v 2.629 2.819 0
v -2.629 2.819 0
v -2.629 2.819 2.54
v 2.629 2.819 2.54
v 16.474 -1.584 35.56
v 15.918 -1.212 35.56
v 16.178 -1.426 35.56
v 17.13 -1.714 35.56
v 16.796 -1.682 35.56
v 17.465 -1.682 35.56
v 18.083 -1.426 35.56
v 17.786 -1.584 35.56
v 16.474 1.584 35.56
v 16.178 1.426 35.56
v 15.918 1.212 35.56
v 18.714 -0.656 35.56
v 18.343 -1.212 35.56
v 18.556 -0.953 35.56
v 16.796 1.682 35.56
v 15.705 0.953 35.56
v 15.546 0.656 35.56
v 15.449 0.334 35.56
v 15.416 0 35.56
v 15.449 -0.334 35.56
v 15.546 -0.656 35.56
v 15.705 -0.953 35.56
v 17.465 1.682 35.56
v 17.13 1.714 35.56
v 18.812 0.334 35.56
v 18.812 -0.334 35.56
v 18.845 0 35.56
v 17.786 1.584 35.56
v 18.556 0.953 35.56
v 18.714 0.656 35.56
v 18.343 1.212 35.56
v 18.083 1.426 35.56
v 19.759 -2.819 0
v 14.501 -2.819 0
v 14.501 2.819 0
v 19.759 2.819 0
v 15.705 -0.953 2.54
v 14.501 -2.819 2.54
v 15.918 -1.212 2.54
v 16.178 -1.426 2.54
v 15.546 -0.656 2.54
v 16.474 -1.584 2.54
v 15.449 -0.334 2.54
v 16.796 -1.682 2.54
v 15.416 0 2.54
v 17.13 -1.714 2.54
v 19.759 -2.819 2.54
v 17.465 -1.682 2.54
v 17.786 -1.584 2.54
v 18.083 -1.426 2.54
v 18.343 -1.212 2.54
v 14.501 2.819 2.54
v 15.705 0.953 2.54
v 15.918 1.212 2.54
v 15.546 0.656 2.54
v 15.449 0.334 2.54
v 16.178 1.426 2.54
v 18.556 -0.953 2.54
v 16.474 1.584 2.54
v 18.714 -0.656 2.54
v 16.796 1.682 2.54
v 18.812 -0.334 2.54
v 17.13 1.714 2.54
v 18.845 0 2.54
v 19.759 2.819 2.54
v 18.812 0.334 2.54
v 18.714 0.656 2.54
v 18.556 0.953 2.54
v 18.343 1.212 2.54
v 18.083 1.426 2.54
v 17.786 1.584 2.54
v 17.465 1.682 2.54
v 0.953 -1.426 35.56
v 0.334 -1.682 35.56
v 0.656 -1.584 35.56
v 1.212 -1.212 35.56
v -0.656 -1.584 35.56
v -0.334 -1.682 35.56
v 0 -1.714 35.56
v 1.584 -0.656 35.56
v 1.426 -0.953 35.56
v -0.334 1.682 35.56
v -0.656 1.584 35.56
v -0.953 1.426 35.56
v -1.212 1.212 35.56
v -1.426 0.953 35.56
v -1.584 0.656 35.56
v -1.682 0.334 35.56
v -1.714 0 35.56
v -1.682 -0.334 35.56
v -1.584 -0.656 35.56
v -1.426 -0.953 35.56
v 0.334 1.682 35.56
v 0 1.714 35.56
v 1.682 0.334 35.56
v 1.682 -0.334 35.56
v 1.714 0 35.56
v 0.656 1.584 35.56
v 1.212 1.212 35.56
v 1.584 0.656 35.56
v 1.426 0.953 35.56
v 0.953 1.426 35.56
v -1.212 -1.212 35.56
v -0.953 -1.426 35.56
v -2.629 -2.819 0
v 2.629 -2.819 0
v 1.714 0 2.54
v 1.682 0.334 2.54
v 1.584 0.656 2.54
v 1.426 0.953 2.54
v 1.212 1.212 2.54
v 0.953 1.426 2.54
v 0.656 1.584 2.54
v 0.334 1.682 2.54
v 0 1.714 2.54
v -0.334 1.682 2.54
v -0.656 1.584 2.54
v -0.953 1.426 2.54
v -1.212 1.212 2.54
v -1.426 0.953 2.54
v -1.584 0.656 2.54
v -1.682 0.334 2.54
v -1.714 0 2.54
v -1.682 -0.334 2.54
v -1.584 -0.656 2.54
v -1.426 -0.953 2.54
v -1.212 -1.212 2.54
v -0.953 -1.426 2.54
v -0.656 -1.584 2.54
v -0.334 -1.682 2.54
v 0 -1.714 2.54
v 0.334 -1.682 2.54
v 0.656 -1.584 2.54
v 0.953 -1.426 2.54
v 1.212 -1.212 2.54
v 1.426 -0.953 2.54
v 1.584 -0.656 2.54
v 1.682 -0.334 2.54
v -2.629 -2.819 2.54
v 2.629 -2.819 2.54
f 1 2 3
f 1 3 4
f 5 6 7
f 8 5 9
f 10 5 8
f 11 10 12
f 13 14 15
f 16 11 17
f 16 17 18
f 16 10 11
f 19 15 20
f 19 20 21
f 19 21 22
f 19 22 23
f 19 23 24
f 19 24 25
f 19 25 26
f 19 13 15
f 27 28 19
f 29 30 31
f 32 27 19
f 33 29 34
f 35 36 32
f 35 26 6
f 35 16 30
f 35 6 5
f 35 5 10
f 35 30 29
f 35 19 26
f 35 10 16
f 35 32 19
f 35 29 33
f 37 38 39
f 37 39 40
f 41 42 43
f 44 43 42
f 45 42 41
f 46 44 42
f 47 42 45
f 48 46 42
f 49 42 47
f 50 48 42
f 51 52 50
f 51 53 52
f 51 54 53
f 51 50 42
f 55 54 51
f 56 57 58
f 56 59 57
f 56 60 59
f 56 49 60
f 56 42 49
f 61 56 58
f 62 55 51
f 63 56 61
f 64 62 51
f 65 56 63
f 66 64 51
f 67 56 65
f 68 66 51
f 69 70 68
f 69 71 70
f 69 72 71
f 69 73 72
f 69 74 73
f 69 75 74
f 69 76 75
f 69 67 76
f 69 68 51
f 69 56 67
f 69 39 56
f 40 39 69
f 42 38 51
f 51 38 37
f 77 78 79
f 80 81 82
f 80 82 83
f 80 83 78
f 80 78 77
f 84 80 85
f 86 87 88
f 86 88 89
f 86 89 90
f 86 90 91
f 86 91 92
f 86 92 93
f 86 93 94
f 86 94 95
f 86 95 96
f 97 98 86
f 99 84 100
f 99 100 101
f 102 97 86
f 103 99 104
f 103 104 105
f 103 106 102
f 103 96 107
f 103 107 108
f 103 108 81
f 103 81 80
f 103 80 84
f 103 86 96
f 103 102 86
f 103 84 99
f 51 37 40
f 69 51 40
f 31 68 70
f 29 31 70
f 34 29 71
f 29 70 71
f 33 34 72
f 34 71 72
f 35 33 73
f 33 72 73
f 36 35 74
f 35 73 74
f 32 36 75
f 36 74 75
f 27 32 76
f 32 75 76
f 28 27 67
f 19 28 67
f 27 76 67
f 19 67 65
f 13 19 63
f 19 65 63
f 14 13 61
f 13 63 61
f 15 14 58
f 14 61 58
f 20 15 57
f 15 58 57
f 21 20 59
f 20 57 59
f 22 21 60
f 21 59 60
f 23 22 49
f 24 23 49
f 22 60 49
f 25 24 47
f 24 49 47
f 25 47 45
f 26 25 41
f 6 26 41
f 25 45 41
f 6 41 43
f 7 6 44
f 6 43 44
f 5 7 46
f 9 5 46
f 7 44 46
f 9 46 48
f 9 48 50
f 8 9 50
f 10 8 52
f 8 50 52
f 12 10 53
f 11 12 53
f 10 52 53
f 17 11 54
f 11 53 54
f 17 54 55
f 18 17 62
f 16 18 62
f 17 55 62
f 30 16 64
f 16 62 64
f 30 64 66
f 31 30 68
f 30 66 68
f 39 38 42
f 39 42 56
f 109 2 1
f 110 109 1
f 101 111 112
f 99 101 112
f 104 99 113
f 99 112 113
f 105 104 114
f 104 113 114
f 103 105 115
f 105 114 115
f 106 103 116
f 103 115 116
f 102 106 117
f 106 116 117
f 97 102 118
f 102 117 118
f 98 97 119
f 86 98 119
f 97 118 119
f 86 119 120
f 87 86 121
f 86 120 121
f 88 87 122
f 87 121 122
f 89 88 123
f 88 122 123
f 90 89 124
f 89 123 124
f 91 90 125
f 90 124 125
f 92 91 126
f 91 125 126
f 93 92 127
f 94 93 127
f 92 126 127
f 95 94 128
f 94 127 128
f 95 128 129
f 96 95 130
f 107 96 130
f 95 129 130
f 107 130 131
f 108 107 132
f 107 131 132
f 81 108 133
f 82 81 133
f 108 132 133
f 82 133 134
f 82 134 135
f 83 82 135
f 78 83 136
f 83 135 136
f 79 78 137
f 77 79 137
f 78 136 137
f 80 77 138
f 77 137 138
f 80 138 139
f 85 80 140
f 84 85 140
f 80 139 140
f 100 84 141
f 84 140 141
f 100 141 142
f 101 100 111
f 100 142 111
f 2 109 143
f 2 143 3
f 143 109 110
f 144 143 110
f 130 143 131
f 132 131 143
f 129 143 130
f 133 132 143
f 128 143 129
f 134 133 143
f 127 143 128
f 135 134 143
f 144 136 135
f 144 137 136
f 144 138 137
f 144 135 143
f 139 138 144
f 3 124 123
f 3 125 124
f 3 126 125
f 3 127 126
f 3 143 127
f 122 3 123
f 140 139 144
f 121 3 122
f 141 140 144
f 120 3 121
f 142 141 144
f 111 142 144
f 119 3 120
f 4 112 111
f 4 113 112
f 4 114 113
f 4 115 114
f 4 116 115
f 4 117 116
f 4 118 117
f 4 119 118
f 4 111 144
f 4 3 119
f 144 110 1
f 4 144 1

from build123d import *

# Parameters (mm, degrees)
F0_W     = 5.2578
F0_H     = 5.6388
F0_R     = 1.79705
F1_DEPTH = 2.54
F2_R     = 1.7145
F3_DEPTH = 33.02
F4_R     = 1.7145
F5_DEPTH = 33.02


with BuildPart() as f1:
    # F0 (on Top) → F1 (new body)
    with BuildSketch(Plane.XY):
        Rectangle(F0_W, F0_H)
        Circle(F0_R, mode=Mode.SUBTRACT)
        with Locations((17.130228, 0)):
            Rectangle(F0_W, F0_H)
        with Locations((17.130228, 0)):
            Circle(F0_R, mode=Mode.SUBTRACT)
        Circle(F0_R)
        with Locations((17.130228, 0)):
            Circle(F0_R)
    extrude(amount=F1_DEPTH)

    # F2 (on face) → F3 (join)
    with BuildSketch(Plane.XY.offset(2.54)):
        Circle(F2_R)
    extrude(amount=F3_DEPTH)

    # F4 (on face) → F5 (join)
    with BuildSketch(Plane.XY.offset(2.54)):
        with Locations((17.130228, 0)):
            Circle(F4_R)
    extrude(amount=F5_DEPTH)


solid = f1.part
